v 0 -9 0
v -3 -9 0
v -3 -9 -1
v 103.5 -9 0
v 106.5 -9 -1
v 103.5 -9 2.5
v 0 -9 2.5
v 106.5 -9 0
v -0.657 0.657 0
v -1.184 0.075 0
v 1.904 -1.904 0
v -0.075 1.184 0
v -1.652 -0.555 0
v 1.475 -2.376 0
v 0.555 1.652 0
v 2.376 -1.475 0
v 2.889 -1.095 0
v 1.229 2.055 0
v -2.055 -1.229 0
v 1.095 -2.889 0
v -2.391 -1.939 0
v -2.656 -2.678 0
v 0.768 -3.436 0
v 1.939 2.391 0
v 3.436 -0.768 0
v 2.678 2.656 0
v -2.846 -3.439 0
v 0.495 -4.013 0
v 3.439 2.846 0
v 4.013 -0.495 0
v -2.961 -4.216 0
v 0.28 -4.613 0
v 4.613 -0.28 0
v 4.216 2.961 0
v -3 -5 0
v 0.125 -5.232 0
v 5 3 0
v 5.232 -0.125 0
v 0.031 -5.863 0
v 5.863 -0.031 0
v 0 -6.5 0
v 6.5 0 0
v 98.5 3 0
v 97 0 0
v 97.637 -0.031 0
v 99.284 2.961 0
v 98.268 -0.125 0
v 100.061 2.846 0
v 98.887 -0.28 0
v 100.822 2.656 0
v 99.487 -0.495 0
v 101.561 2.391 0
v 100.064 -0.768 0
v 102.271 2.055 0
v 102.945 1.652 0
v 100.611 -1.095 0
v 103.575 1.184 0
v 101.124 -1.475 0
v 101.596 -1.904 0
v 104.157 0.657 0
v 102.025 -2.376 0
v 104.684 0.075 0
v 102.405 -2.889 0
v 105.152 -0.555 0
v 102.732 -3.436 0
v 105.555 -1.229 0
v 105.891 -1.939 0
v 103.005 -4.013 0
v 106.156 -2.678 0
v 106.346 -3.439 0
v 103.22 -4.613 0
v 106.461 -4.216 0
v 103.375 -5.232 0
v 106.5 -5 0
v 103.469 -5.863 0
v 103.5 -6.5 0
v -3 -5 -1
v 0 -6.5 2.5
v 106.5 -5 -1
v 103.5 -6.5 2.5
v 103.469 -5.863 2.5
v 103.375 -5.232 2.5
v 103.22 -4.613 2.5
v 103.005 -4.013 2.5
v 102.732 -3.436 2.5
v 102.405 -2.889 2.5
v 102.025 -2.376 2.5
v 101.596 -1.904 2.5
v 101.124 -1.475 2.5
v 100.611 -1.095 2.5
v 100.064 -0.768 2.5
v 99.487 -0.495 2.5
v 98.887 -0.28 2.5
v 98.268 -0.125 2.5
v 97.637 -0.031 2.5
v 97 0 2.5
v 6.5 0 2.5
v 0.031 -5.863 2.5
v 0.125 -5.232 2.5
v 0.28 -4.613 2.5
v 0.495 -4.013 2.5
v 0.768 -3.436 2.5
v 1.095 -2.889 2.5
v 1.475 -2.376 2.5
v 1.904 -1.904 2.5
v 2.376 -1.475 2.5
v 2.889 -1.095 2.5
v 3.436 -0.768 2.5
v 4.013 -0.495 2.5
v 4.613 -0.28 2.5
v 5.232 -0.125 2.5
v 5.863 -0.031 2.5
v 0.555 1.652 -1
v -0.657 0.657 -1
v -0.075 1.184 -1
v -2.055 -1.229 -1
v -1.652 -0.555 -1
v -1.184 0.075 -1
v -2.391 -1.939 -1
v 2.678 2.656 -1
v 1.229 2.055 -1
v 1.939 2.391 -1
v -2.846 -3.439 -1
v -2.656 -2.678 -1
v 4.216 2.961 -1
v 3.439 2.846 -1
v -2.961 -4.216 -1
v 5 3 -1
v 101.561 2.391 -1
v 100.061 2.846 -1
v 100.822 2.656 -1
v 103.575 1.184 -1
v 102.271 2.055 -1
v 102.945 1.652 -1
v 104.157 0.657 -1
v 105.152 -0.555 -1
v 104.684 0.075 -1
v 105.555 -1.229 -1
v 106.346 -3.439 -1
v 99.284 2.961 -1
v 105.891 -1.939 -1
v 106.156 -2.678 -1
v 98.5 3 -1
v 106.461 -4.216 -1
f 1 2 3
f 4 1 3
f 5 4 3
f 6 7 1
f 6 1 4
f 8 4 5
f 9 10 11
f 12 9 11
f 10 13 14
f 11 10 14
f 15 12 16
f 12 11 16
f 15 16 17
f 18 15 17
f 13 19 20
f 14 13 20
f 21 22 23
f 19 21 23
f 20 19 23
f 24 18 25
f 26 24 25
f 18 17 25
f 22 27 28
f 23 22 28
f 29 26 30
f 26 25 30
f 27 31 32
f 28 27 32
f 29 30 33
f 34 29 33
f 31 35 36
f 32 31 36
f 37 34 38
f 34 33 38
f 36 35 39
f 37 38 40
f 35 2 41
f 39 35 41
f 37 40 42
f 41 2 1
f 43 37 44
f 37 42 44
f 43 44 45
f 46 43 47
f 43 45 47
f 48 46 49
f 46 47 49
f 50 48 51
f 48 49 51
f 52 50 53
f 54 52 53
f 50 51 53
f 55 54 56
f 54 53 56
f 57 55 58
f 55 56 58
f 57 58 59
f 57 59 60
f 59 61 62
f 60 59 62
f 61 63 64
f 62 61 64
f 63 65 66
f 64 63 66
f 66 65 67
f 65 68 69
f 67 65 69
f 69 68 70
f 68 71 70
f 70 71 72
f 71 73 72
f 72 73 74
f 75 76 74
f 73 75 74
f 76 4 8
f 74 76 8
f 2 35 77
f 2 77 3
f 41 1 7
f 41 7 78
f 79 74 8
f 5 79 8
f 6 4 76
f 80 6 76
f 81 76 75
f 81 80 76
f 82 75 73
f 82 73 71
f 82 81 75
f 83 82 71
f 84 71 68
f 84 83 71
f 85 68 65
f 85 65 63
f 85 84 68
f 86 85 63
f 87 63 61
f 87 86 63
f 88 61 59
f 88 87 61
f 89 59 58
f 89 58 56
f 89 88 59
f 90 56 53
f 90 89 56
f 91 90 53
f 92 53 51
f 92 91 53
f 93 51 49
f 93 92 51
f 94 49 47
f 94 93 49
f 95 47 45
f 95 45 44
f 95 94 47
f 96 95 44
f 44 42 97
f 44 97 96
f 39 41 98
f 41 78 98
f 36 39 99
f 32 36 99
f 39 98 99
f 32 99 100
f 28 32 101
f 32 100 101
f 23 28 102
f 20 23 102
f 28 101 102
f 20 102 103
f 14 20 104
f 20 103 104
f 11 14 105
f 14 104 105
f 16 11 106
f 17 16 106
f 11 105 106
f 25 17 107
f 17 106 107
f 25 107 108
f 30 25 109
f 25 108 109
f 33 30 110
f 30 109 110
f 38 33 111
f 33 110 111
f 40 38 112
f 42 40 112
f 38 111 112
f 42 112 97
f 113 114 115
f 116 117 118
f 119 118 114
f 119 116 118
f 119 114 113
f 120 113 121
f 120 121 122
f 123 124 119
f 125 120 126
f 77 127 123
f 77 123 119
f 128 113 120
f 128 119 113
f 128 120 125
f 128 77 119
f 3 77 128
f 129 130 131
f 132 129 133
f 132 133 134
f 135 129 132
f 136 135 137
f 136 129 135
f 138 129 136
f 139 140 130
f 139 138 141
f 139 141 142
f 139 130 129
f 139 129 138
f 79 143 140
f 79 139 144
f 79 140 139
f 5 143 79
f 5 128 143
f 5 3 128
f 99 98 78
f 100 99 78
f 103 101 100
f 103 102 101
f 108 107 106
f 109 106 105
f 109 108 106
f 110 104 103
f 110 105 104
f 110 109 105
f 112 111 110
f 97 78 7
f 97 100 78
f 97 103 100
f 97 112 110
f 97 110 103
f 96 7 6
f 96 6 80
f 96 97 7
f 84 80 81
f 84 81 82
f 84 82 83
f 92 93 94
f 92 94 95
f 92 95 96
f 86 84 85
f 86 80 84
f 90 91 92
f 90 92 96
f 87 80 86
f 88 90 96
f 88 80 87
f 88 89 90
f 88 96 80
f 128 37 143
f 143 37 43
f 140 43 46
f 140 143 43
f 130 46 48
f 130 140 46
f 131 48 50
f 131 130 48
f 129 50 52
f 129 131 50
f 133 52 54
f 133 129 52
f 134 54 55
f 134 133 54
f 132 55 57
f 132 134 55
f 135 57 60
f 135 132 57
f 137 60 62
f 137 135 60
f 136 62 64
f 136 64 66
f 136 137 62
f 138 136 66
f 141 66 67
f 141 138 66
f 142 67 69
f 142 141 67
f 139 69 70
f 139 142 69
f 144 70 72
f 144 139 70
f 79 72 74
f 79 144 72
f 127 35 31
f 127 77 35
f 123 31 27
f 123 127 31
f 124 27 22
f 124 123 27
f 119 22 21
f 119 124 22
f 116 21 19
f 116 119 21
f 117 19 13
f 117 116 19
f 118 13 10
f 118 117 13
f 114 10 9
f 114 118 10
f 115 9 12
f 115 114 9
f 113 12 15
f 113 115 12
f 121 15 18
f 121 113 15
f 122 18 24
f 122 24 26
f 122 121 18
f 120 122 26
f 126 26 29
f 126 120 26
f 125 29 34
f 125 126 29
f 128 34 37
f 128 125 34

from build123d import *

# Parameters (mm, degrees)
F0_W     = 103.5
F0_H     = 9
F1_DEPTH = 2.5
F2_R     = 6.5
F3_W     = 109.5
F3_H     = 12
F4_DEPTH = 1
F5_R     = 8


with BuildPart() as f1:
    # F0 (on Top) → F1 (new body)
    with BuildSketch(Plane.XY):
        with Locations((51.75, -4.5)):
            Rectangle(F0_W, F0_H)
    extrude(amount=F1_DEPTH)

    # F2
    f2_edges = [f1.edges().sort_by_distance(p)[0] for p in [
        (103.5, 0, 1.25),
        (0, 0, 1.25),
    ]]
    fillet(f2_edges, radius=F2_R)

    # F3 (on face) → F4 (join)
    with BuildSketch(Plane(origin=(0, 0, 0), x_dir=(1, 0, 0), z_dir=(0, 0, -1))):
        with Locations((51.75, 3)):
            Rectangle(F3_W, F3_H)
    extrude(amount=F4_DEPTH)

    # F5
    f5_edges = [f1.edges().sort_by_distance(p)[0] for p in [
        (106.5, 3, -0.5),
        (-3, 3, -0.5),
    ]]
    fillet(f5_edges, radius=F5_R)


solid = f1.part
